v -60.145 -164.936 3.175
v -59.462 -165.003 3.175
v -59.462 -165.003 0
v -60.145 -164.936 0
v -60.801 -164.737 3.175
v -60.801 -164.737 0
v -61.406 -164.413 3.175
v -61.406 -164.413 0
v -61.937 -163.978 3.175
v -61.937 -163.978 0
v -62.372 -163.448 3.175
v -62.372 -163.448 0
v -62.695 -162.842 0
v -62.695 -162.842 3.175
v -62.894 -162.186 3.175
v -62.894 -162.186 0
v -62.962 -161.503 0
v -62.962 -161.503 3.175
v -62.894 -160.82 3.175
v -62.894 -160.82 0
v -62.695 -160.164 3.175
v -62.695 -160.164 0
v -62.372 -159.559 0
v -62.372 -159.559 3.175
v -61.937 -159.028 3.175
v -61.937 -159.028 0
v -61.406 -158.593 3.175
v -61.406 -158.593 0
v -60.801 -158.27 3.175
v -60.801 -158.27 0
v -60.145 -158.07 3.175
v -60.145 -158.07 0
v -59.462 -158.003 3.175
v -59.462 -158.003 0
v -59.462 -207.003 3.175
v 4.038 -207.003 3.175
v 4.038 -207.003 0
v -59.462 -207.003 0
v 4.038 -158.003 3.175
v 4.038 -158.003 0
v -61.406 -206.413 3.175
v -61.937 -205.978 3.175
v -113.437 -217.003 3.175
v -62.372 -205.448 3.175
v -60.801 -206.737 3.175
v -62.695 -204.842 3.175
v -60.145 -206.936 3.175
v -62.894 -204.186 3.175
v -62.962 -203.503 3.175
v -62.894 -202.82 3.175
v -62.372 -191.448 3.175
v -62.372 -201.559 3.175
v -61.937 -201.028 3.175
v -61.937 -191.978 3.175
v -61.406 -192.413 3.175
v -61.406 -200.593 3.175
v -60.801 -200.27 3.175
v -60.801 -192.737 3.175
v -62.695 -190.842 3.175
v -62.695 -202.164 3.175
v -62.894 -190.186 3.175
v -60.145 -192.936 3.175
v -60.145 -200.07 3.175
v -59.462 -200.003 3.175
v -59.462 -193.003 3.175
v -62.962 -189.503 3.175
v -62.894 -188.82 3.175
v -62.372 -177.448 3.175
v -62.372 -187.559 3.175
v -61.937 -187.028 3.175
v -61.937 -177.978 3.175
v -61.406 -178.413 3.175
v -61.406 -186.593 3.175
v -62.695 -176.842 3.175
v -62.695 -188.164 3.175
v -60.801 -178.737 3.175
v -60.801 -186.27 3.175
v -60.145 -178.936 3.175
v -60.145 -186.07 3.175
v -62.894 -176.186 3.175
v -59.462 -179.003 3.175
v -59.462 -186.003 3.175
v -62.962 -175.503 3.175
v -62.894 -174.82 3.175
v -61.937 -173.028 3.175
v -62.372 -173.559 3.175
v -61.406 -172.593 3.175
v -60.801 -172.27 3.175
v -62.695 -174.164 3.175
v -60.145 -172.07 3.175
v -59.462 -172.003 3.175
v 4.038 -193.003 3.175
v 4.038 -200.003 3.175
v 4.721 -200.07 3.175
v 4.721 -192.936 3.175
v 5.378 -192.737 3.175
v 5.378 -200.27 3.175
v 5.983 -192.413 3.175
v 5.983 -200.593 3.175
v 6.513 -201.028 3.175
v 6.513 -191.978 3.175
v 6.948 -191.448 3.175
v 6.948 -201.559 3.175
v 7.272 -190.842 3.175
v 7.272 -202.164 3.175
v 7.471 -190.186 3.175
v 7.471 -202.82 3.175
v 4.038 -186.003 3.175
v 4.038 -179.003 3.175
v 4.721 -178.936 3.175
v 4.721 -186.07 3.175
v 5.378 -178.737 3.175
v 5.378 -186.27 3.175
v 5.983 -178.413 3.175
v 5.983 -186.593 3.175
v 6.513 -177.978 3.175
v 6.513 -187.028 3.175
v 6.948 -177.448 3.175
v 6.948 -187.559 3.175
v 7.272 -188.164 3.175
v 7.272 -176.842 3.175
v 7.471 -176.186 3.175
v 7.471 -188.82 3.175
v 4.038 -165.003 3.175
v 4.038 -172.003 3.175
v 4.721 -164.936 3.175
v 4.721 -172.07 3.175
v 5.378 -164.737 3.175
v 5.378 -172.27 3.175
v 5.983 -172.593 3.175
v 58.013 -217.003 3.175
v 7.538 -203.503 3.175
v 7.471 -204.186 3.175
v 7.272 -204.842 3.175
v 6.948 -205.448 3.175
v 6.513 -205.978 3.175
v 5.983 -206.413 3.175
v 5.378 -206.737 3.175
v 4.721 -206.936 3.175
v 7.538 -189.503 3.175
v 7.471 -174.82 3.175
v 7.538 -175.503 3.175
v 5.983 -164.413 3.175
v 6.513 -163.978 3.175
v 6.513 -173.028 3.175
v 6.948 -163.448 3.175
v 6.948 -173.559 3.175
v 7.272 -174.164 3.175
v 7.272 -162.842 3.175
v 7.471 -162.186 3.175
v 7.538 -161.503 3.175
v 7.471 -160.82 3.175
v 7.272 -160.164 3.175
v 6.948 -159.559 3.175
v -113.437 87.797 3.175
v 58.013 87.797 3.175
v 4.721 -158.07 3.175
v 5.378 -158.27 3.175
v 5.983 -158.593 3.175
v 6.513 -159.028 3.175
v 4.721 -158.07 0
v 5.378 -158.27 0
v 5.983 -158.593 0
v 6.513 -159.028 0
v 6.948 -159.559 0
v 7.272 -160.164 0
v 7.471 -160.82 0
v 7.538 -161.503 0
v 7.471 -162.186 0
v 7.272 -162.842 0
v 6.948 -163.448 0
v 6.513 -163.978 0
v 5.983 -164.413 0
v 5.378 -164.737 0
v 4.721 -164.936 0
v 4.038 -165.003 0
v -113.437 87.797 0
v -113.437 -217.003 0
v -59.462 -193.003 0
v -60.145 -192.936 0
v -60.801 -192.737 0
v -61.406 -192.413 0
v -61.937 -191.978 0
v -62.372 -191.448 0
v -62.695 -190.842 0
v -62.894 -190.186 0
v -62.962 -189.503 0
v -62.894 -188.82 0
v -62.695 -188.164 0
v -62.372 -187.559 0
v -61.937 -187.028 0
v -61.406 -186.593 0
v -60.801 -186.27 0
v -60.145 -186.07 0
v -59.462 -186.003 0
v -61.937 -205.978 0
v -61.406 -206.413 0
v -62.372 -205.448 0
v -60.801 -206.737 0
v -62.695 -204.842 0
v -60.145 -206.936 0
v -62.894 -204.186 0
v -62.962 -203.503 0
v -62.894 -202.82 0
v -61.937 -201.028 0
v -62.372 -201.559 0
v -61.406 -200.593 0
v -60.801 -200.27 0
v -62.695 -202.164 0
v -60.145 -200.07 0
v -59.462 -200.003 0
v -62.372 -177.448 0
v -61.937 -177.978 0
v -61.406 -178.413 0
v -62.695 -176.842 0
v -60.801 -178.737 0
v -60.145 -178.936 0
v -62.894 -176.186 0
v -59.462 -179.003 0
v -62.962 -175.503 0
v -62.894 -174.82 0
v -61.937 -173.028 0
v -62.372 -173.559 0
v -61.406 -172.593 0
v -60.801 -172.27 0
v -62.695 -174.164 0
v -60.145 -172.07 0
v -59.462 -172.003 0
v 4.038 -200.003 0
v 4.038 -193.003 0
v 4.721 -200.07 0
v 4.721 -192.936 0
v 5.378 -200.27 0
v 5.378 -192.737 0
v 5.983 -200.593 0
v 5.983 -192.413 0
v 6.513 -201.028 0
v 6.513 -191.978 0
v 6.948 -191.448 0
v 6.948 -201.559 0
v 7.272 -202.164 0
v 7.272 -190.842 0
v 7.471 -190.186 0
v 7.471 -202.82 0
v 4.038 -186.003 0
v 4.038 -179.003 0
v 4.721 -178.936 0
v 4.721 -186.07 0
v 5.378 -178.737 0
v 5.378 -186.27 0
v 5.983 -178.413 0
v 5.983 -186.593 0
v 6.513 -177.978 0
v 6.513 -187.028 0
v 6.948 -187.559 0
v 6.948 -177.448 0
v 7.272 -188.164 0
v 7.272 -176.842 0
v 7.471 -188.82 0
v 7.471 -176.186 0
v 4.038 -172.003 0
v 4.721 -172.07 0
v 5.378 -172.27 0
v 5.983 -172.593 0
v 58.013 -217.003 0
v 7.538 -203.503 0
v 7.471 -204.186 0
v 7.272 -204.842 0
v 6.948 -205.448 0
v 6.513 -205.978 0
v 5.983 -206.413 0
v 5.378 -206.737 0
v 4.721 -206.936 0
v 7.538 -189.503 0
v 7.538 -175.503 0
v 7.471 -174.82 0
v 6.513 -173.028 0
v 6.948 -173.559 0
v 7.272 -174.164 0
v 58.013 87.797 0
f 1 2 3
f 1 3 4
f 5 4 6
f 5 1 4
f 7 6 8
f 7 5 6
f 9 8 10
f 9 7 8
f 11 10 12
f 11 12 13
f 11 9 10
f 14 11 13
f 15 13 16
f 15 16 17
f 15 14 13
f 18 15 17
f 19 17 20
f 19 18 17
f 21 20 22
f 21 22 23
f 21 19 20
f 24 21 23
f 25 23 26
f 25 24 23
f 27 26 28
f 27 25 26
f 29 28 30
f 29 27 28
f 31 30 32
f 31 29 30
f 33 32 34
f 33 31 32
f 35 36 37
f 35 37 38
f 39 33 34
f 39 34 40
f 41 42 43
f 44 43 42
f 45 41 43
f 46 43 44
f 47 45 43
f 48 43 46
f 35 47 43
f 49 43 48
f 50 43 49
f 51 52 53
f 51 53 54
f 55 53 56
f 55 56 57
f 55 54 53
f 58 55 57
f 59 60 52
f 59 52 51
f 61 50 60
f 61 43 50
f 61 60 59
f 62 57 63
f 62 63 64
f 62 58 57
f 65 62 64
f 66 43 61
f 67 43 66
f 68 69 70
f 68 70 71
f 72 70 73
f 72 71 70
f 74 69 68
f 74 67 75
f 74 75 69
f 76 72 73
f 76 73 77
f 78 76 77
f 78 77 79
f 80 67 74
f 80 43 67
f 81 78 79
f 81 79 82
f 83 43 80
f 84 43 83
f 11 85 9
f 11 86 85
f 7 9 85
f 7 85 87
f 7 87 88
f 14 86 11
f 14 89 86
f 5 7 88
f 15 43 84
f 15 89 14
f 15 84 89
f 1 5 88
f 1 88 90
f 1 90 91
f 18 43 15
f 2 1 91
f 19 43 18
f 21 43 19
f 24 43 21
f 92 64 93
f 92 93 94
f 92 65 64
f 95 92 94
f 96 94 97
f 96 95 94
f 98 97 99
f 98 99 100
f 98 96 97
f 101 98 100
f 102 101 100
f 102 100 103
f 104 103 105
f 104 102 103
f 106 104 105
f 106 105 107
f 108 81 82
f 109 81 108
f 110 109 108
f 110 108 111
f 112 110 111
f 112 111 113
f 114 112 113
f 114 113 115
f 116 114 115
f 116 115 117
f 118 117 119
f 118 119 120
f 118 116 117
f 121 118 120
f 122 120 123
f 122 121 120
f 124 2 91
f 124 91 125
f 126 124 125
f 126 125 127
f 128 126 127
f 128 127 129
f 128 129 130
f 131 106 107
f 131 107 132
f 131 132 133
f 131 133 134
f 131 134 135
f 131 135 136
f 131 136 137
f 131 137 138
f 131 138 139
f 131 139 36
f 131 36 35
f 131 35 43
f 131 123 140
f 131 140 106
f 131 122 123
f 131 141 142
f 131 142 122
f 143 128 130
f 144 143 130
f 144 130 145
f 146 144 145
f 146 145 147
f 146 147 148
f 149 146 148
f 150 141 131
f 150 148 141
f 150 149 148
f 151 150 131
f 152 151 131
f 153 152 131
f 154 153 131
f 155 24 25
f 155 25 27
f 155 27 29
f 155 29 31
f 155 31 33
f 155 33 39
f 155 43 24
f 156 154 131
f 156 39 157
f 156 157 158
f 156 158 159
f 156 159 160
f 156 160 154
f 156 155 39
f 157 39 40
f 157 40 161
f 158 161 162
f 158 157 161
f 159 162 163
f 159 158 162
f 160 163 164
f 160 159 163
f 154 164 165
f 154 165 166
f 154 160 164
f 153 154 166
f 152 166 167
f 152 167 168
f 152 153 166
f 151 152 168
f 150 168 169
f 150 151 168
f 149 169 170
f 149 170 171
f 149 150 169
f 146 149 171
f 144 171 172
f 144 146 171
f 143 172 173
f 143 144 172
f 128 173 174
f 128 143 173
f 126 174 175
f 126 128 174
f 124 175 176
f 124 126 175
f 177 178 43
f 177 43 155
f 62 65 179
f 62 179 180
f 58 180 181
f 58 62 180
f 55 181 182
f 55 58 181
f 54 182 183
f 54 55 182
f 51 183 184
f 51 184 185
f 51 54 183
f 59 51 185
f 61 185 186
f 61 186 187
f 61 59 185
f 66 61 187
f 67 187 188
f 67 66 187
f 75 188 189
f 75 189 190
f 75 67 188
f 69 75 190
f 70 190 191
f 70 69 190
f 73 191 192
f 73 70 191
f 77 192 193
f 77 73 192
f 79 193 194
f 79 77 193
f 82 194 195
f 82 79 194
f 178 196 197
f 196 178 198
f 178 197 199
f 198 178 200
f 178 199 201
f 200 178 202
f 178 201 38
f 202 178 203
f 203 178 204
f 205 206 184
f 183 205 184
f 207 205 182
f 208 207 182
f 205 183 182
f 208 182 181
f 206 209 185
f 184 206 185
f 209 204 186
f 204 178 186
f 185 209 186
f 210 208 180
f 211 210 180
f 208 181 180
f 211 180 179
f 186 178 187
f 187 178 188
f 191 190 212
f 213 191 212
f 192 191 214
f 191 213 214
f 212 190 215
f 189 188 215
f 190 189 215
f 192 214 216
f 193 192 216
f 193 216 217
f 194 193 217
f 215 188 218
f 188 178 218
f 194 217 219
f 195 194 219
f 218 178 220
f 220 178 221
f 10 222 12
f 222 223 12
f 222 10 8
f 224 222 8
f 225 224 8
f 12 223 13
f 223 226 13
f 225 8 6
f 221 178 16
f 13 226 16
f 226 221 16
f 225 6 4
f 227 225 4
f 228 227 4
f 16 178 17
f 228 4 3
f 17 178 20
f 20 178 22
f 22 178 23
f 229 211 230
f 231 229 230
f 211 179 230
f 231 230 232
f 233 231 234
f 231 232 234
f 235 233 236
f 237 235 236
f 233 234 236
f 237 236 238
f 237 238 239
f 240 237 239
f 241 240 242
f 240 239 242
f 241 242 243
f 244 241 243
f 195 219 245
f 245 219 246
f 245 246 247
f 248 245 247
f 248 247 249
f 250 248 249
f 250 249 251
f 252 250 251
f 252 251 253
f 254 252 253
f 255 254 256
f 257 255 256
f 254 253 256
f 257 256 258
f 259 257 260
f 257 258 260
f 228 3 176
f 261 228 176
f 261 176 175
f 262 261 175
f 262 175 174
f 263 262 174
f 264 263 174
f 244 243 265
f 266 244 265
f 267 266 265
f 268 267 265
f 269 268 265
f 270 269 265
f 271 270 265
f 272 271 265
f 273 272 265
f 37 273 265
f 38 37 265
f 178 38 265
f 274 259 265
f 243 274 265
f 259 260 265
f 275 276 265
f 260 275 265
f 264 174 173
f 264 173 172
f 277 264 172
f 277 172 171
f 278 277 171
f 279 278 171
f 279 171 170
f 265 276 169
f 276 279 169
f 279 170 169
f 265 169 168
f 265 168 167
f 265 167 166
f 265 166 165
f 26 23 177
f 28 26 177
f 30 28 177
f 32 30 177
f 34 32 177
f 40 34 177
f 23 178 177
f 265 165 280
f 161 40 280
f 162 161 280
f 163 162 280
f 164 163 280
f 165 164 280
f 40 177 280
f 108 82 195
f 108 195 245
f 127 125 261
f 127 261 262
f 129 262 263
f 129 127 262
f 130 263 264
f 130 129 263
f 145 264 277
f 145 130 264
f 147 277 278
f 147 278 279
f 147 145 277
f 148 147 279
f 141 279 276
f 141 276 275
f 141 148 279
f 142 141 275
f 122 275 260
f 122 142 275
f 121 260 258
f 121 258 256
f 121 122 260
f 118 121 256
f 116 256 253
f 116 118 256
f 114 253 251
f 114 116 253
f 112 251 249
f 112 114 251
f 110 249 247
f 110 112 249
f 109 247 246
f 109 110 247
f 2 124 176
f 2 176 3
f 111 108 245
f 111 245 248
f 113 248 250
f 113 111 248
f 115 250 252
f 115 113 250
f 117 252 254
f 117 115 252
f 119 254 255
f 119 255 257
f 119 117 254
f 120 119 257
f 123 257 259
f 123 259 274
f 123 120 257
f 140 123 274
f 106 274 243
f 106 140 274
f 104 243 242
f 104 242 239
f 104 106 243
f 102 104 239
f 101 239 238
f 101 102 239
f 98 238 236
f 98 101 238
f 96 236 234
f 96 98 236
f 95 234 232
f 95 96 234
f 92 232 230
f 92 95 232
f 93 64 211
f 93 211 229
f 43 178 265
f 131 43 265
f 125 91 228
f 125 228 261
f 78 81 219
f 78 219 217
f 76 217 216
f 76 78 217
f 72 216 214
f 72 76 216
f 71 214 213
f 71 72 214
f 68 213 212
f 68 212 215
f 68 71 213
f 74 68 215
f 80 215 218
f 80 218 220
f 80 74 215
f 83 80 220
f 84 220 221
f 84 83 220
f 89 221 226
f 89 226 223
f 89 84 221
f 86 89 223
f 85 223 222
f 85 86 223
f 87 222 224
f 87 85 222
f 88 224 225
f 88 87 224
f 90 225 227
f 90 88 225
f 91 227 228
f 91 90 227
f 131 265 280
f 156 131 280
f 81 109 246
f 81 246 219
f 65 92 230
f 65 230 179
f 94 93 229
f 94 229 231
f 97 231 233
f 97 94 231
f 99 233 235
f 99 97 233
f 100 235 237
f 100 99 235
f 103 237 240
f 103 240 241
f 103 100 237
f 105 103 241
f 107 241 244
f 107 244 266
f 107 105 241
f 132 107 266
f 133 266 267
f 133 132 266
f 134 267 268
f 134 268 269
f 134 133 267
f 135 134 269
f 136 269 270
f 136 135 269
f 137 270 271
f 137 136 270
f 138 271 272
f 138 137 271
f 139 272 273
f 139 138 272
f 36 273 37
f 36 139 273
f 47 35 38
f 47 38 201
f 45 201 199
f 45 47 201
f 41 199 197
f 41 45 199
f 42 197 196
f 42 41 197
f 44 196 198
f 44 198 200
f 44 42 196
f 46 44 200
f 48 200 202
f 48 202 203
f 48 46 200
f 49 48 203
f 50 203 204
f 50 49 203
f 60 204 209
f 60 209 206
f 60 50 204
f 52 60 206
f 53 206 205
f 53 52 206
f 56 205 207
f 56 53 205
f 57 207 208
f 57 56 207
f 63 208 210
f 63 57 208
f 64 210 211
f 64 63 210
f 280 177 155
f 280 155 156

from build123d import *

# Parameters (mm, degrees)
SKETCH1_W           = 171.45
SKETCH1_H           = 304.8
BOSS_EXTRUDE1_DEPTH = 3.175
CUT_EXTRUDE1_DEPTH  = 3.175


with BuildPart() as part:
    # Sketch1 → Boss-Extrude1 (new body)
    with BuildSketch(Plane.XY):
        with Locations((-27.711706949, -64.603096677)):
            Rectangle(SKETCH1_W, SKETCH1_H)
    extrude(amount=BOSS_EXTRUDE1_DEPTH)

    # Sketch2 → Cut-Extrude1 (cut)
    with BuildSketch(Plane.XY.offset(3.175)):
        with BuildLine():
            Line((-59.461706949, -200.003096677), (4.038293051, -200.003096677))
            ThreePointArc((4.038293051, -200.003096677), (7.538293051, -203.503096677), (4.038293051, -207.003096677))
            Line((4.038293051, -207.003096677), (-59.461706949, -207.003096677))
            ThreePointArc((-59.461706949, -207.003096677), (-62.961706949, -203.503096677), (-59.461706949, -200.003096677))
        make_face()
        with BuildLine():
            Line((-59.461706949, -186.003096677), (4.038293051, -186.003096677))
            ThreePointArc((4.038293051, -186.003096677), (7.538293051, -189.503096677), (4.038293051, -193.003096677))
            Line((4.038293051, -193.003096677), (-59.461706949, -193.003096677))
            ThreePointArc((-59.461706949, -193.003096677), (-62.961706949, -189.503096677), (-59.461706949, -186.003096677))
        make_face()
        with BuildLine():
            Line((-59.461706949, -172.003096677), (4.038293051, -172.003096677))
            ThreePointArc((4.038293051, -172.003096677), (7.538293051, -175.503096677), (4.038293051, -179.003096677))
            Line((4.038293051, -179.003096677), (-59.461706949, -179.003096677))
            ThreePointArc((-59.461706949, -179.003096677), (-62.961706949, -175.503096677), (-59.461706949, -172.003096677))
        make_face()
        with BuildLine():
            Line((-59.461706949, -158.003096677), (4.038293051, -158.003096677))
            ThreePointArc((4.038293051, -158.003096677), (7.538293051, -161.503096677), (4.038293051, -165.003096677))
            Line((4.038293051, -165.003096677), (-59.461706949, -165.003096677))
            ThreePointArc((-59.461706949, -165.003096677), (-62.961706949, -161.503096677), (-59.461706949, -158.003096677))
        make_face()
    extrude(amount=-CUT_EXTRUDE1_DEPTH, mode=Mode.SUBTRACT)


solid = part.part
